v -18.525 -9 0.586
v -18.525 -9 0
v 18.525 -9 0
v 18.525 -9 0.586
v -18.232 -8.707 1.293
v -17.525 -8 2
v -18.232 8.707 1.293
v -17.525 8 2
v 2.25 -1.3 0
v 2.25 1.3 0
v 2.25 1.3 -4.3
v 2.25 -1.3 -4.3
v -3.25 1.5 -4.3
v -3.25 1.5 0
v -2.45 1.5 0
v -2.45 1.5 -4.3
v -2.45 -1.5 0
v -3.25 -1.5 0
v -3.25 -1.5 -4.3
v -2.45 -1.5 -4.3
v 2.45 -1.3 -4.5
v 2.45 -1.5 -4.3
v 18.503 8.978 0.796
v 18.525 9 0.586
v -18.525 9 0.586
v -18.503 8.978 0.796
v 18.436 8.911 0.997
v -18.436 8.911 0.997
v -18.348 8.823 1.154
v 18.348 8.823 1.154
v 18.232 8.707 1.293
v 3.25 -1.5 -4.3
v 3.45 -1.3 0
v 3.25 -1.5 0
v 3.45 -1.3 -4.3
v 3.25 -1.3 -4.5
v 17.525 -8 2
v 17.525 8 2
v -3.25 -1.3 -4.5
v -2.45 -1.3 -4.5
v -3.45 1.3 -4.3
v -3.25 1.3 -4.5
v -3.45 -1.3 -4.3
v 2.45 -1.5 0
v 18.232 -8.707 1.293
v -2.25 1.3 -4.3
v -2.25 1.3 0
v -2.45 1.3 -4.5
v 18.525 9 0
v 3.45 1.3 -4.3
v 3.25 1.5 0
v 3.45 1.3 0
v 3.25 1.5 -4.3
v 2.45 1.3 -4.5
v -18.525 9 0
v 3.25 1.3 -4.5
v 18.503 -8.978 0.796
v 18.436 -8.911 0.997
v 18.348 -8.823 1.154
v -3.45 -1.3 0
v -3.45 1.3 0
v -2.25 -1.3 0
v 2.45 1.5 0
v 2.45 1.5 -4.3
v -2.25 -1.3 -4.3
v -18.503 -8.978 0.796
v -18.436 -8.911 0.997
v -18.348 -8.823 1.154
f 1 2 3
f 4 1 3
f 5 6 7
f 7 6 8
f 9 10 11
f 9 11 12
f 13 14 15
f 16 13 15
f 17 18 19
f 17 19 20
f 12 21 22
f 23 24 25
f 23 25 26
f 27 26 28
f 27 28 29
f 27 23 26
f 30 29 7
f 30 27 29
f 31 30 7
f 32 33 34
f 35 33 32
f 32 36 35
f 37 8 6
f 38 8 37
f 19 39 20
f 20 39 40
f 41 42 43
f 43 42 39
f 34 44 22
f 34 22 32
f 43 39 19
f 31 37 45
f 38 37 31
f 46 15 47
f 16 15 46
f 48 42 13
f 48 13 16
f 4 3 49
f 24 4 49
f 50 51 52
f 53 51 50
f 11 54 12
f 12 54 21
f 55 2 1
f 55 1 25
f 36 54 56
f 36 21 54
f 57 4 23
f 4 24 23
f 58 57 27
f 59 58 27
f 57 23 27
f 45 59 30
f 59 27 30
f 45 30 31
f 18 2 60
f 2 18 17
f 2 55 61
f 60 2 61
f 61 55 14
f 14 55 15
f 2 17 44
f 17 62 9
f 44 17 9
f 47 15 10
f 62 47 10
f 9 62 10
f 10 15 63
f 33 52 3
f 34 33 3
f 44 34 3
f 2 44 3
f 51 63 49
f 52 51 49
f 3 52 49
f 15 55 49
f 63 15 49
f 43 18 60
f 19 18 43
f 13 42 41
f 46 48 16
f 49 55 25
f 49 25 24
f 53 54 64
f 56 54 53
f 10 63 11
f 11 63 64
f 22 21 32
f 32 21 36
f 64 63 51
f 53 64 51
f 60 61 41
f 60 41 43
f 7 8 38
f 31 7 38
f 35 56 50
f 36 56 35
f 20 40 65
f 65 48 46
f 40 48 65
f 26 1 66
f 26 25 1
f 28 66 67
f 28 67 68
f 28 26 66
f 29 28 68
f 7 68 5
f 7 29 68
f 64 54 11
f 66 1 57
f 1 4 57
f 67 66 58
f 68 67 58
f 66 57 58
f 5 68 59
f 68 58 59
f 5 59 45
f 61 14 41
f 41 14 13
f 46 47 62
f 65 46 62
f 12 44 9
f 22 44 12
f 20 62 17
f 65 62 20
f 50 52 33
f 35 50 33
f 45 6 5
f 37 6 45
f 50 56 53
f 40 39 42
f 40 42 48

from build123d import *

# Parameters (mm, degrees)
SKETCH_W        = 37.05
SKETCH_H        = 18
PAD_DEPTH       = 2
CHAMFER_SIZE    = 1
FILLET_R        = 1
SKETCH001_W     = 1.2
SKETCH001_H     = 3
PAD001_DEPTH    = 4.5
CHAMFER001_SIZE = 0.2


with BuildPart() as part:
    # Sketch → Pad (new body)
    with BuildSketch(Plane.XY):
        Rectangle(SKETCH_W, SKETCH_H)
    extrude(amount=PAD_DEPTH)

    # Chamfer
    chamfer_edges = [part.edges().sort_by_distance(p)[0] for p in [
        (-18.525, 0, 2),
        (0, 9, 2),
        (18.525, 0, 2),
        (0, -9, 2),
    ]]
    chamfer(chamfer_edges, length=CHAMFER_SIZE)

    # Fillet
    fillet_edges = [part.edges().sort_by_distance(p)[0] for p in [
        (0, -9, 1),
        (18.525, 0, 1),
        (-18.525, 0, 1),
        (0, 9, 1),
    ]]
    fillet(fillet_edges, radius=FILLET_R)

    # Sketch001 (on Face4 of Fillet) → Pad001 (join)
    with BuildSketch(Plane(origin=(0, 0, 0), x_dir=(1, 0, 0), z_dir=(0, 0, -1))):
        with Locations((-2.85, 0)):
            Rectangle(SKETCH001_W, SKETCH001_H)
        with Locations((2.85, 0)):
            Rectangle(SKETCH001_W, SKETCH001_H)
    extrude(amount=PAD001_DEPTH)

    # Chamfer001
    chamfer001_edges = [part.edges().sort_by_distance(p)[0] for p in [
        (2.85, 1.5, -4.5),
        (3.45, 0, -4.5),
        (2.85, -1.5, -4.5),
        (2.25, 0, -4.5),
        (3.45, 1.5, -2.25),
        (2.25, 1.5, -2.25),
        (3.45, -1.5, -2.25),
        (2.25, -1.5, -2.25),
        (-2.25, 0, -4.5),
        (-2.85, -1.5, -4.5),
        (-3.45, 0, -4.5),
        (-2.85, 1.5, -4.5),
        (-2.25, -1.5, -2.25),
        (-3.45, -1.5, -2.25),
        (-3.45, 1.5, -2.25),
        (-2.25, 1.5, -2.25),
    ]]
    chamfer(chamfer001_edges, length=CHAMFER001_SIZE)


solid = part.part
